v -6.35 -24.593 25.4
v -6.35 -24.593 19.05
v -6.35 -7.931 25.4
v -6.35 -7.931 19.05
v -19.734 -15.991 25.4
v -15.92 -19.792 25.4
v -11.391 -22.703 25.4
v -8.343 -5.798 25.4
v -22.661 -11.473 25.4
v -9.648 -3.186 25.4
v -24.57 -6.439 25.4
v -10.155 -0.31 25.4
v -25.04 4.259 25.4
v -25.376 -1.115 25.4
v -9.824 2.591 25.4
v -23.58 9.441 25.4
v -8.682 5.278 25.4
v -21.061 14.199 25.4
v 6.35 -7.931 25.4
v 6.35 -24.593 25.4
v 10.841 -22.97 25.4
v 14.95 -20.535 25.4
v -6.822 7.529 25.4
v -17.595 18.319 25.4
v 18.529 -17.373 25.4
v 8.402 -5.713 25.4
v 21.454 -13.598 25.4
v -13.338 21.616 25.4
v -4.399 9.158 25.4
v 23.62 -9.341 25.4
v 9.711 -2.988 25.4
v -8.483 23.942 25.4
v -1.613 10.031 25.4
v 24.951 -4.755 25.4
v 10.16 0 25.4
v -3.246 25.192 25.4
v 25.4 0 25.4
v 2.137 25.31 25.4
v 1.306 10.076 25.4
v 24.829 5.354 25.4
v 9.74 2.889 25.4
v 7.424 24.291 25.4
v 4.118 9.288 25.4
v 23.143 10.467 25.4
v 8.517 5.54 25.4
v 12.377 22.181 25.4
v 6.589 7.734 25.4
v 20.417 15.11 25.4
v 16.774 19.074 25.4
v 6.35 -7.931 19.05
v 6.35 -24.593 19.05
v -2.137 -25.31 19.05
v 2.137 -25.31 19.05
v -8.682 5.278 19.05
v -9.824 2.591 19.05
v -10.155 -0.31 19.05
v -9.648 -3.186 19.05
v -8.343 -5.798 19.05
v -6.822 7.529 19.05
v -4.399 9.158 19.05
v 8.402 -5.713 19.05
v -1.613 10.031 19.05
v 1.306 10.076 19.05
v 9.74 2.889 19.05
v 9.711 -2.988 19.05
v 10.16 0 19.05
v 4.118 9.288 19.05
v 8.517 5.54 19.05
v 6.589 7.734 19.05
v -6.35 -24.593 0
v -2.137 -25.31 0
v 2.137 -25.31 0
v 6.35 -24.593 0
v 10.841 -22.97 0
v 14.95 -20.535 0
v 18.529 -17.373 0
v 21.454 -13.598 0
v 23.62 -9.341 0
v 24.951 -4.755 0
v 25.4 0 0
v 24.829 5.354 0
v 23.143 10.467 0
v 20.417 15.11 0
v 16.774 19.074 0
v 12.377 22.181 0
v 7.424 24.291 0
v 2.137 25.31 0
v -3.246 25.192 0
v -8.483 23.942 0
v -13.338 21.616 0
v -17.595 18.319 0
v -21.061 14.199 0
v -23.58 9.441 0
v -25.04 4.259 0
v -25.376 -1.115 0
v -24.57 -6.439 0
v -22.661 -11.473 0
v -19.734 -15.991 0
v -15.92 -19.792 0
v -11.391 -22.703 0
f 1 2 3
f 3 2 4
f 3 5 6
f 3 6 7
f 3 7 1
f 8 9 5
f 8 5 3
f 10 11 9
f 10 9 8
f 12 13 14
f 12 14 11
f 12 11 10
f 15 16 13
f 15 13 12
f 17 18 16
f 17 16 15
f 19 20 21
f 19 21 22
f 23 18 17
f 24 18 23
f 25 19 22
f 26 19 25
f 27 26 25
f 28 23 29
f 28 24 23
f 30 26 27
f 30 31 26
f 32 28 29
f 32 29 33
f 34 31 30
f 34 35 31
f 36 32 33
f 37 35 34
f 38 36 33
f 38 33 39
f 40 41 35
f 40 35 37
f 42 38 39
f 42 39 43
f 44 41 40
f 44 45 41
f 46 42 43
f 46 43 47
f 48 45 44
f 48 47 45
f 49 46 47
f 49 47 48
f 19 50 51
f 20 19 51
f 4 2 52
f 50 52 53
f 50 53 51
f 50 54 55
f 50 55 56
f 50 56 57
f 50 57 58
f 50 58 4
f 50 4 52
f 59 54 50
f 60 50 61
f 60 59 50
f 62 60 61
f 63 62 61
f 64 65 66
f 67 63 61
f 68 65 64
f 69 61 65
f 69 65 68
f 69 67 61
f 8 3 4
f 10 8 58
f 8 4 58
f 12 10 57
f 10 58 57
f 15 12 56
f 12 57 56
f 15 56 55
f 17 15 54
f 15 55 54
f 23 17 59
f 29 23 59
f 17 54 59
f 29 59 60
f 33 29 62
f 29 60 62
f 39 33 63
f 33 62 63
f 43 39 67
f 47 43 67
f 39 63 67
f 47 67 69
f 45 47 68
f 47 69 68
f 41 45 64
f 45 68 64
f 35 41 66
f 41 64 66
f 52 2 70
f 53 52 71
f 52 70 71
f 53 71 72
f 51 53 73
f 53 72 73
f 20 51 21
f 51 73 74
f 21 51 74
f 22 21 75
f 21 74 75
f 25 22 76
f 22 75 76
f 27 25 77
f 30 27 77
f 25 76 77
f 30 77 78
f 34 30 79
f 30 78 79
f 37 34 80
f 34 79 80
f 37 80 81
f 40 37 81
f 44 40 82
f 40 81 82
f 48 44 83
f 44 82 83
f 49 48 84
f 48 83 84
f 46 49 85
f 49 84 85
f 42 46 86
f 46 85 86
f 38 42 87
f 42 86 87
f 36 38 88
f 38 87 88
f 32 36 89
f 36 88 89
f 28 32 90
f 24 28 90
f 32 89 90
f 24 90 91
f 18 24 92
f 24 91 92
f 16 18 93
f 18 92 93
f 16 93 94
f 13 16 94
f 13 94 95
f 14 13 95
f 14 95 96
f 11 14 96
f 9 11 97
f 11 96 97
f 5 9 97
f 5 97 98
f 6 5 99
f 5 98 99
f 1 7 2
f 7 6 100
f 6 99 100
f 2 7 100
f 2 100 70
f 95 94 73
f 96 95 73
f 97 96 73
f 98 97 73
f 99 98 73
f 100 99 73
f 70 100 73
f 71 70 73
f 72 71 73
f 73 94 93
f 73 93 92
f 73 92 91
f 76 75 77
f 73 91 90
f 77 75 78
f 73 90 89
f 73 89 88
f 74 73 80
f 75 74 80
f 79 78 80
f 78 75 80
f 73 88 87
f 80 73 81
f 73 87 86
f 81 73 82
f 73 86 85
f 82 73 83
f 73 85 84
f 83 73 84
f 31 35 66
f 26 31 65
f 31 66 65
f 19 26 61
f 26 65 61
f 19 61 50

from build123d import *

# Parameters (mm, degrees)
F1_DEPTH = 19.05
F2_DEPTH = 19.05
F3_DEPTH = 25.4


with BuildPart() as f1:
    # F0 (on Top) → F1 (new body)
    with BuildSketch(Plane.XY):
        with BuildLine():
            ThreePointArc((10.16, 0), (-4.399409, 9.1581), (-6.35, -7.931147))
            ThreePointArc((-6.35, -7.931147), (0, -10.16), (6.35, -7.931147))
            ThreePointArc((6.35, -7.931147), (9.1581, -4.399409), (10.16, 0))
        make_face()
    extrude(amount=F1_DEPTH)

    # F0 (on Top) → F2 (join)
    with BuildSketch(Plane.XY):
        with BuildLine():
            Line((-6.35, -7.931147), (-6.35, -24.593444))
            ThreePointArc((-6.35, -24.593444), (0, -25.4), (6.35, -24.593444))
            Line((6.35, -24.593444), (6.35, -7.931147))
            ThreePointArc((6.35, -7.931147), (0, -10.16), (-6.35, -7.931147))
        make_face()
    extrude(amount=F2_DEPTH)

    # F0 (on Top) → F3 (join)
    with BuildSketch(Plane.XY):
        with BuildLine():
            ThreePointArc((6.35, -24.593444), (20.080463, -15.55426), (25.4, 0))
            ThreePointArc((25.4, 0), (-15.55426, 20.080463), (-6.35, -24.593444))
            Line((-6.35, -24.593444), (-6.35, -7.931147))
            ThreePointArc((-6.35, -7.931147), (-4.399409, 9.1581), (10.16, 0))
            ThreePointArc((10.16, 0), (9.1581, -4.399409), (6.35, -7.931147))
            Line((6.35, -7.931147), (6.35, -24.593444))
        make_face()
    extrude(amount=F3_DEPTH)


solid = f1.part
